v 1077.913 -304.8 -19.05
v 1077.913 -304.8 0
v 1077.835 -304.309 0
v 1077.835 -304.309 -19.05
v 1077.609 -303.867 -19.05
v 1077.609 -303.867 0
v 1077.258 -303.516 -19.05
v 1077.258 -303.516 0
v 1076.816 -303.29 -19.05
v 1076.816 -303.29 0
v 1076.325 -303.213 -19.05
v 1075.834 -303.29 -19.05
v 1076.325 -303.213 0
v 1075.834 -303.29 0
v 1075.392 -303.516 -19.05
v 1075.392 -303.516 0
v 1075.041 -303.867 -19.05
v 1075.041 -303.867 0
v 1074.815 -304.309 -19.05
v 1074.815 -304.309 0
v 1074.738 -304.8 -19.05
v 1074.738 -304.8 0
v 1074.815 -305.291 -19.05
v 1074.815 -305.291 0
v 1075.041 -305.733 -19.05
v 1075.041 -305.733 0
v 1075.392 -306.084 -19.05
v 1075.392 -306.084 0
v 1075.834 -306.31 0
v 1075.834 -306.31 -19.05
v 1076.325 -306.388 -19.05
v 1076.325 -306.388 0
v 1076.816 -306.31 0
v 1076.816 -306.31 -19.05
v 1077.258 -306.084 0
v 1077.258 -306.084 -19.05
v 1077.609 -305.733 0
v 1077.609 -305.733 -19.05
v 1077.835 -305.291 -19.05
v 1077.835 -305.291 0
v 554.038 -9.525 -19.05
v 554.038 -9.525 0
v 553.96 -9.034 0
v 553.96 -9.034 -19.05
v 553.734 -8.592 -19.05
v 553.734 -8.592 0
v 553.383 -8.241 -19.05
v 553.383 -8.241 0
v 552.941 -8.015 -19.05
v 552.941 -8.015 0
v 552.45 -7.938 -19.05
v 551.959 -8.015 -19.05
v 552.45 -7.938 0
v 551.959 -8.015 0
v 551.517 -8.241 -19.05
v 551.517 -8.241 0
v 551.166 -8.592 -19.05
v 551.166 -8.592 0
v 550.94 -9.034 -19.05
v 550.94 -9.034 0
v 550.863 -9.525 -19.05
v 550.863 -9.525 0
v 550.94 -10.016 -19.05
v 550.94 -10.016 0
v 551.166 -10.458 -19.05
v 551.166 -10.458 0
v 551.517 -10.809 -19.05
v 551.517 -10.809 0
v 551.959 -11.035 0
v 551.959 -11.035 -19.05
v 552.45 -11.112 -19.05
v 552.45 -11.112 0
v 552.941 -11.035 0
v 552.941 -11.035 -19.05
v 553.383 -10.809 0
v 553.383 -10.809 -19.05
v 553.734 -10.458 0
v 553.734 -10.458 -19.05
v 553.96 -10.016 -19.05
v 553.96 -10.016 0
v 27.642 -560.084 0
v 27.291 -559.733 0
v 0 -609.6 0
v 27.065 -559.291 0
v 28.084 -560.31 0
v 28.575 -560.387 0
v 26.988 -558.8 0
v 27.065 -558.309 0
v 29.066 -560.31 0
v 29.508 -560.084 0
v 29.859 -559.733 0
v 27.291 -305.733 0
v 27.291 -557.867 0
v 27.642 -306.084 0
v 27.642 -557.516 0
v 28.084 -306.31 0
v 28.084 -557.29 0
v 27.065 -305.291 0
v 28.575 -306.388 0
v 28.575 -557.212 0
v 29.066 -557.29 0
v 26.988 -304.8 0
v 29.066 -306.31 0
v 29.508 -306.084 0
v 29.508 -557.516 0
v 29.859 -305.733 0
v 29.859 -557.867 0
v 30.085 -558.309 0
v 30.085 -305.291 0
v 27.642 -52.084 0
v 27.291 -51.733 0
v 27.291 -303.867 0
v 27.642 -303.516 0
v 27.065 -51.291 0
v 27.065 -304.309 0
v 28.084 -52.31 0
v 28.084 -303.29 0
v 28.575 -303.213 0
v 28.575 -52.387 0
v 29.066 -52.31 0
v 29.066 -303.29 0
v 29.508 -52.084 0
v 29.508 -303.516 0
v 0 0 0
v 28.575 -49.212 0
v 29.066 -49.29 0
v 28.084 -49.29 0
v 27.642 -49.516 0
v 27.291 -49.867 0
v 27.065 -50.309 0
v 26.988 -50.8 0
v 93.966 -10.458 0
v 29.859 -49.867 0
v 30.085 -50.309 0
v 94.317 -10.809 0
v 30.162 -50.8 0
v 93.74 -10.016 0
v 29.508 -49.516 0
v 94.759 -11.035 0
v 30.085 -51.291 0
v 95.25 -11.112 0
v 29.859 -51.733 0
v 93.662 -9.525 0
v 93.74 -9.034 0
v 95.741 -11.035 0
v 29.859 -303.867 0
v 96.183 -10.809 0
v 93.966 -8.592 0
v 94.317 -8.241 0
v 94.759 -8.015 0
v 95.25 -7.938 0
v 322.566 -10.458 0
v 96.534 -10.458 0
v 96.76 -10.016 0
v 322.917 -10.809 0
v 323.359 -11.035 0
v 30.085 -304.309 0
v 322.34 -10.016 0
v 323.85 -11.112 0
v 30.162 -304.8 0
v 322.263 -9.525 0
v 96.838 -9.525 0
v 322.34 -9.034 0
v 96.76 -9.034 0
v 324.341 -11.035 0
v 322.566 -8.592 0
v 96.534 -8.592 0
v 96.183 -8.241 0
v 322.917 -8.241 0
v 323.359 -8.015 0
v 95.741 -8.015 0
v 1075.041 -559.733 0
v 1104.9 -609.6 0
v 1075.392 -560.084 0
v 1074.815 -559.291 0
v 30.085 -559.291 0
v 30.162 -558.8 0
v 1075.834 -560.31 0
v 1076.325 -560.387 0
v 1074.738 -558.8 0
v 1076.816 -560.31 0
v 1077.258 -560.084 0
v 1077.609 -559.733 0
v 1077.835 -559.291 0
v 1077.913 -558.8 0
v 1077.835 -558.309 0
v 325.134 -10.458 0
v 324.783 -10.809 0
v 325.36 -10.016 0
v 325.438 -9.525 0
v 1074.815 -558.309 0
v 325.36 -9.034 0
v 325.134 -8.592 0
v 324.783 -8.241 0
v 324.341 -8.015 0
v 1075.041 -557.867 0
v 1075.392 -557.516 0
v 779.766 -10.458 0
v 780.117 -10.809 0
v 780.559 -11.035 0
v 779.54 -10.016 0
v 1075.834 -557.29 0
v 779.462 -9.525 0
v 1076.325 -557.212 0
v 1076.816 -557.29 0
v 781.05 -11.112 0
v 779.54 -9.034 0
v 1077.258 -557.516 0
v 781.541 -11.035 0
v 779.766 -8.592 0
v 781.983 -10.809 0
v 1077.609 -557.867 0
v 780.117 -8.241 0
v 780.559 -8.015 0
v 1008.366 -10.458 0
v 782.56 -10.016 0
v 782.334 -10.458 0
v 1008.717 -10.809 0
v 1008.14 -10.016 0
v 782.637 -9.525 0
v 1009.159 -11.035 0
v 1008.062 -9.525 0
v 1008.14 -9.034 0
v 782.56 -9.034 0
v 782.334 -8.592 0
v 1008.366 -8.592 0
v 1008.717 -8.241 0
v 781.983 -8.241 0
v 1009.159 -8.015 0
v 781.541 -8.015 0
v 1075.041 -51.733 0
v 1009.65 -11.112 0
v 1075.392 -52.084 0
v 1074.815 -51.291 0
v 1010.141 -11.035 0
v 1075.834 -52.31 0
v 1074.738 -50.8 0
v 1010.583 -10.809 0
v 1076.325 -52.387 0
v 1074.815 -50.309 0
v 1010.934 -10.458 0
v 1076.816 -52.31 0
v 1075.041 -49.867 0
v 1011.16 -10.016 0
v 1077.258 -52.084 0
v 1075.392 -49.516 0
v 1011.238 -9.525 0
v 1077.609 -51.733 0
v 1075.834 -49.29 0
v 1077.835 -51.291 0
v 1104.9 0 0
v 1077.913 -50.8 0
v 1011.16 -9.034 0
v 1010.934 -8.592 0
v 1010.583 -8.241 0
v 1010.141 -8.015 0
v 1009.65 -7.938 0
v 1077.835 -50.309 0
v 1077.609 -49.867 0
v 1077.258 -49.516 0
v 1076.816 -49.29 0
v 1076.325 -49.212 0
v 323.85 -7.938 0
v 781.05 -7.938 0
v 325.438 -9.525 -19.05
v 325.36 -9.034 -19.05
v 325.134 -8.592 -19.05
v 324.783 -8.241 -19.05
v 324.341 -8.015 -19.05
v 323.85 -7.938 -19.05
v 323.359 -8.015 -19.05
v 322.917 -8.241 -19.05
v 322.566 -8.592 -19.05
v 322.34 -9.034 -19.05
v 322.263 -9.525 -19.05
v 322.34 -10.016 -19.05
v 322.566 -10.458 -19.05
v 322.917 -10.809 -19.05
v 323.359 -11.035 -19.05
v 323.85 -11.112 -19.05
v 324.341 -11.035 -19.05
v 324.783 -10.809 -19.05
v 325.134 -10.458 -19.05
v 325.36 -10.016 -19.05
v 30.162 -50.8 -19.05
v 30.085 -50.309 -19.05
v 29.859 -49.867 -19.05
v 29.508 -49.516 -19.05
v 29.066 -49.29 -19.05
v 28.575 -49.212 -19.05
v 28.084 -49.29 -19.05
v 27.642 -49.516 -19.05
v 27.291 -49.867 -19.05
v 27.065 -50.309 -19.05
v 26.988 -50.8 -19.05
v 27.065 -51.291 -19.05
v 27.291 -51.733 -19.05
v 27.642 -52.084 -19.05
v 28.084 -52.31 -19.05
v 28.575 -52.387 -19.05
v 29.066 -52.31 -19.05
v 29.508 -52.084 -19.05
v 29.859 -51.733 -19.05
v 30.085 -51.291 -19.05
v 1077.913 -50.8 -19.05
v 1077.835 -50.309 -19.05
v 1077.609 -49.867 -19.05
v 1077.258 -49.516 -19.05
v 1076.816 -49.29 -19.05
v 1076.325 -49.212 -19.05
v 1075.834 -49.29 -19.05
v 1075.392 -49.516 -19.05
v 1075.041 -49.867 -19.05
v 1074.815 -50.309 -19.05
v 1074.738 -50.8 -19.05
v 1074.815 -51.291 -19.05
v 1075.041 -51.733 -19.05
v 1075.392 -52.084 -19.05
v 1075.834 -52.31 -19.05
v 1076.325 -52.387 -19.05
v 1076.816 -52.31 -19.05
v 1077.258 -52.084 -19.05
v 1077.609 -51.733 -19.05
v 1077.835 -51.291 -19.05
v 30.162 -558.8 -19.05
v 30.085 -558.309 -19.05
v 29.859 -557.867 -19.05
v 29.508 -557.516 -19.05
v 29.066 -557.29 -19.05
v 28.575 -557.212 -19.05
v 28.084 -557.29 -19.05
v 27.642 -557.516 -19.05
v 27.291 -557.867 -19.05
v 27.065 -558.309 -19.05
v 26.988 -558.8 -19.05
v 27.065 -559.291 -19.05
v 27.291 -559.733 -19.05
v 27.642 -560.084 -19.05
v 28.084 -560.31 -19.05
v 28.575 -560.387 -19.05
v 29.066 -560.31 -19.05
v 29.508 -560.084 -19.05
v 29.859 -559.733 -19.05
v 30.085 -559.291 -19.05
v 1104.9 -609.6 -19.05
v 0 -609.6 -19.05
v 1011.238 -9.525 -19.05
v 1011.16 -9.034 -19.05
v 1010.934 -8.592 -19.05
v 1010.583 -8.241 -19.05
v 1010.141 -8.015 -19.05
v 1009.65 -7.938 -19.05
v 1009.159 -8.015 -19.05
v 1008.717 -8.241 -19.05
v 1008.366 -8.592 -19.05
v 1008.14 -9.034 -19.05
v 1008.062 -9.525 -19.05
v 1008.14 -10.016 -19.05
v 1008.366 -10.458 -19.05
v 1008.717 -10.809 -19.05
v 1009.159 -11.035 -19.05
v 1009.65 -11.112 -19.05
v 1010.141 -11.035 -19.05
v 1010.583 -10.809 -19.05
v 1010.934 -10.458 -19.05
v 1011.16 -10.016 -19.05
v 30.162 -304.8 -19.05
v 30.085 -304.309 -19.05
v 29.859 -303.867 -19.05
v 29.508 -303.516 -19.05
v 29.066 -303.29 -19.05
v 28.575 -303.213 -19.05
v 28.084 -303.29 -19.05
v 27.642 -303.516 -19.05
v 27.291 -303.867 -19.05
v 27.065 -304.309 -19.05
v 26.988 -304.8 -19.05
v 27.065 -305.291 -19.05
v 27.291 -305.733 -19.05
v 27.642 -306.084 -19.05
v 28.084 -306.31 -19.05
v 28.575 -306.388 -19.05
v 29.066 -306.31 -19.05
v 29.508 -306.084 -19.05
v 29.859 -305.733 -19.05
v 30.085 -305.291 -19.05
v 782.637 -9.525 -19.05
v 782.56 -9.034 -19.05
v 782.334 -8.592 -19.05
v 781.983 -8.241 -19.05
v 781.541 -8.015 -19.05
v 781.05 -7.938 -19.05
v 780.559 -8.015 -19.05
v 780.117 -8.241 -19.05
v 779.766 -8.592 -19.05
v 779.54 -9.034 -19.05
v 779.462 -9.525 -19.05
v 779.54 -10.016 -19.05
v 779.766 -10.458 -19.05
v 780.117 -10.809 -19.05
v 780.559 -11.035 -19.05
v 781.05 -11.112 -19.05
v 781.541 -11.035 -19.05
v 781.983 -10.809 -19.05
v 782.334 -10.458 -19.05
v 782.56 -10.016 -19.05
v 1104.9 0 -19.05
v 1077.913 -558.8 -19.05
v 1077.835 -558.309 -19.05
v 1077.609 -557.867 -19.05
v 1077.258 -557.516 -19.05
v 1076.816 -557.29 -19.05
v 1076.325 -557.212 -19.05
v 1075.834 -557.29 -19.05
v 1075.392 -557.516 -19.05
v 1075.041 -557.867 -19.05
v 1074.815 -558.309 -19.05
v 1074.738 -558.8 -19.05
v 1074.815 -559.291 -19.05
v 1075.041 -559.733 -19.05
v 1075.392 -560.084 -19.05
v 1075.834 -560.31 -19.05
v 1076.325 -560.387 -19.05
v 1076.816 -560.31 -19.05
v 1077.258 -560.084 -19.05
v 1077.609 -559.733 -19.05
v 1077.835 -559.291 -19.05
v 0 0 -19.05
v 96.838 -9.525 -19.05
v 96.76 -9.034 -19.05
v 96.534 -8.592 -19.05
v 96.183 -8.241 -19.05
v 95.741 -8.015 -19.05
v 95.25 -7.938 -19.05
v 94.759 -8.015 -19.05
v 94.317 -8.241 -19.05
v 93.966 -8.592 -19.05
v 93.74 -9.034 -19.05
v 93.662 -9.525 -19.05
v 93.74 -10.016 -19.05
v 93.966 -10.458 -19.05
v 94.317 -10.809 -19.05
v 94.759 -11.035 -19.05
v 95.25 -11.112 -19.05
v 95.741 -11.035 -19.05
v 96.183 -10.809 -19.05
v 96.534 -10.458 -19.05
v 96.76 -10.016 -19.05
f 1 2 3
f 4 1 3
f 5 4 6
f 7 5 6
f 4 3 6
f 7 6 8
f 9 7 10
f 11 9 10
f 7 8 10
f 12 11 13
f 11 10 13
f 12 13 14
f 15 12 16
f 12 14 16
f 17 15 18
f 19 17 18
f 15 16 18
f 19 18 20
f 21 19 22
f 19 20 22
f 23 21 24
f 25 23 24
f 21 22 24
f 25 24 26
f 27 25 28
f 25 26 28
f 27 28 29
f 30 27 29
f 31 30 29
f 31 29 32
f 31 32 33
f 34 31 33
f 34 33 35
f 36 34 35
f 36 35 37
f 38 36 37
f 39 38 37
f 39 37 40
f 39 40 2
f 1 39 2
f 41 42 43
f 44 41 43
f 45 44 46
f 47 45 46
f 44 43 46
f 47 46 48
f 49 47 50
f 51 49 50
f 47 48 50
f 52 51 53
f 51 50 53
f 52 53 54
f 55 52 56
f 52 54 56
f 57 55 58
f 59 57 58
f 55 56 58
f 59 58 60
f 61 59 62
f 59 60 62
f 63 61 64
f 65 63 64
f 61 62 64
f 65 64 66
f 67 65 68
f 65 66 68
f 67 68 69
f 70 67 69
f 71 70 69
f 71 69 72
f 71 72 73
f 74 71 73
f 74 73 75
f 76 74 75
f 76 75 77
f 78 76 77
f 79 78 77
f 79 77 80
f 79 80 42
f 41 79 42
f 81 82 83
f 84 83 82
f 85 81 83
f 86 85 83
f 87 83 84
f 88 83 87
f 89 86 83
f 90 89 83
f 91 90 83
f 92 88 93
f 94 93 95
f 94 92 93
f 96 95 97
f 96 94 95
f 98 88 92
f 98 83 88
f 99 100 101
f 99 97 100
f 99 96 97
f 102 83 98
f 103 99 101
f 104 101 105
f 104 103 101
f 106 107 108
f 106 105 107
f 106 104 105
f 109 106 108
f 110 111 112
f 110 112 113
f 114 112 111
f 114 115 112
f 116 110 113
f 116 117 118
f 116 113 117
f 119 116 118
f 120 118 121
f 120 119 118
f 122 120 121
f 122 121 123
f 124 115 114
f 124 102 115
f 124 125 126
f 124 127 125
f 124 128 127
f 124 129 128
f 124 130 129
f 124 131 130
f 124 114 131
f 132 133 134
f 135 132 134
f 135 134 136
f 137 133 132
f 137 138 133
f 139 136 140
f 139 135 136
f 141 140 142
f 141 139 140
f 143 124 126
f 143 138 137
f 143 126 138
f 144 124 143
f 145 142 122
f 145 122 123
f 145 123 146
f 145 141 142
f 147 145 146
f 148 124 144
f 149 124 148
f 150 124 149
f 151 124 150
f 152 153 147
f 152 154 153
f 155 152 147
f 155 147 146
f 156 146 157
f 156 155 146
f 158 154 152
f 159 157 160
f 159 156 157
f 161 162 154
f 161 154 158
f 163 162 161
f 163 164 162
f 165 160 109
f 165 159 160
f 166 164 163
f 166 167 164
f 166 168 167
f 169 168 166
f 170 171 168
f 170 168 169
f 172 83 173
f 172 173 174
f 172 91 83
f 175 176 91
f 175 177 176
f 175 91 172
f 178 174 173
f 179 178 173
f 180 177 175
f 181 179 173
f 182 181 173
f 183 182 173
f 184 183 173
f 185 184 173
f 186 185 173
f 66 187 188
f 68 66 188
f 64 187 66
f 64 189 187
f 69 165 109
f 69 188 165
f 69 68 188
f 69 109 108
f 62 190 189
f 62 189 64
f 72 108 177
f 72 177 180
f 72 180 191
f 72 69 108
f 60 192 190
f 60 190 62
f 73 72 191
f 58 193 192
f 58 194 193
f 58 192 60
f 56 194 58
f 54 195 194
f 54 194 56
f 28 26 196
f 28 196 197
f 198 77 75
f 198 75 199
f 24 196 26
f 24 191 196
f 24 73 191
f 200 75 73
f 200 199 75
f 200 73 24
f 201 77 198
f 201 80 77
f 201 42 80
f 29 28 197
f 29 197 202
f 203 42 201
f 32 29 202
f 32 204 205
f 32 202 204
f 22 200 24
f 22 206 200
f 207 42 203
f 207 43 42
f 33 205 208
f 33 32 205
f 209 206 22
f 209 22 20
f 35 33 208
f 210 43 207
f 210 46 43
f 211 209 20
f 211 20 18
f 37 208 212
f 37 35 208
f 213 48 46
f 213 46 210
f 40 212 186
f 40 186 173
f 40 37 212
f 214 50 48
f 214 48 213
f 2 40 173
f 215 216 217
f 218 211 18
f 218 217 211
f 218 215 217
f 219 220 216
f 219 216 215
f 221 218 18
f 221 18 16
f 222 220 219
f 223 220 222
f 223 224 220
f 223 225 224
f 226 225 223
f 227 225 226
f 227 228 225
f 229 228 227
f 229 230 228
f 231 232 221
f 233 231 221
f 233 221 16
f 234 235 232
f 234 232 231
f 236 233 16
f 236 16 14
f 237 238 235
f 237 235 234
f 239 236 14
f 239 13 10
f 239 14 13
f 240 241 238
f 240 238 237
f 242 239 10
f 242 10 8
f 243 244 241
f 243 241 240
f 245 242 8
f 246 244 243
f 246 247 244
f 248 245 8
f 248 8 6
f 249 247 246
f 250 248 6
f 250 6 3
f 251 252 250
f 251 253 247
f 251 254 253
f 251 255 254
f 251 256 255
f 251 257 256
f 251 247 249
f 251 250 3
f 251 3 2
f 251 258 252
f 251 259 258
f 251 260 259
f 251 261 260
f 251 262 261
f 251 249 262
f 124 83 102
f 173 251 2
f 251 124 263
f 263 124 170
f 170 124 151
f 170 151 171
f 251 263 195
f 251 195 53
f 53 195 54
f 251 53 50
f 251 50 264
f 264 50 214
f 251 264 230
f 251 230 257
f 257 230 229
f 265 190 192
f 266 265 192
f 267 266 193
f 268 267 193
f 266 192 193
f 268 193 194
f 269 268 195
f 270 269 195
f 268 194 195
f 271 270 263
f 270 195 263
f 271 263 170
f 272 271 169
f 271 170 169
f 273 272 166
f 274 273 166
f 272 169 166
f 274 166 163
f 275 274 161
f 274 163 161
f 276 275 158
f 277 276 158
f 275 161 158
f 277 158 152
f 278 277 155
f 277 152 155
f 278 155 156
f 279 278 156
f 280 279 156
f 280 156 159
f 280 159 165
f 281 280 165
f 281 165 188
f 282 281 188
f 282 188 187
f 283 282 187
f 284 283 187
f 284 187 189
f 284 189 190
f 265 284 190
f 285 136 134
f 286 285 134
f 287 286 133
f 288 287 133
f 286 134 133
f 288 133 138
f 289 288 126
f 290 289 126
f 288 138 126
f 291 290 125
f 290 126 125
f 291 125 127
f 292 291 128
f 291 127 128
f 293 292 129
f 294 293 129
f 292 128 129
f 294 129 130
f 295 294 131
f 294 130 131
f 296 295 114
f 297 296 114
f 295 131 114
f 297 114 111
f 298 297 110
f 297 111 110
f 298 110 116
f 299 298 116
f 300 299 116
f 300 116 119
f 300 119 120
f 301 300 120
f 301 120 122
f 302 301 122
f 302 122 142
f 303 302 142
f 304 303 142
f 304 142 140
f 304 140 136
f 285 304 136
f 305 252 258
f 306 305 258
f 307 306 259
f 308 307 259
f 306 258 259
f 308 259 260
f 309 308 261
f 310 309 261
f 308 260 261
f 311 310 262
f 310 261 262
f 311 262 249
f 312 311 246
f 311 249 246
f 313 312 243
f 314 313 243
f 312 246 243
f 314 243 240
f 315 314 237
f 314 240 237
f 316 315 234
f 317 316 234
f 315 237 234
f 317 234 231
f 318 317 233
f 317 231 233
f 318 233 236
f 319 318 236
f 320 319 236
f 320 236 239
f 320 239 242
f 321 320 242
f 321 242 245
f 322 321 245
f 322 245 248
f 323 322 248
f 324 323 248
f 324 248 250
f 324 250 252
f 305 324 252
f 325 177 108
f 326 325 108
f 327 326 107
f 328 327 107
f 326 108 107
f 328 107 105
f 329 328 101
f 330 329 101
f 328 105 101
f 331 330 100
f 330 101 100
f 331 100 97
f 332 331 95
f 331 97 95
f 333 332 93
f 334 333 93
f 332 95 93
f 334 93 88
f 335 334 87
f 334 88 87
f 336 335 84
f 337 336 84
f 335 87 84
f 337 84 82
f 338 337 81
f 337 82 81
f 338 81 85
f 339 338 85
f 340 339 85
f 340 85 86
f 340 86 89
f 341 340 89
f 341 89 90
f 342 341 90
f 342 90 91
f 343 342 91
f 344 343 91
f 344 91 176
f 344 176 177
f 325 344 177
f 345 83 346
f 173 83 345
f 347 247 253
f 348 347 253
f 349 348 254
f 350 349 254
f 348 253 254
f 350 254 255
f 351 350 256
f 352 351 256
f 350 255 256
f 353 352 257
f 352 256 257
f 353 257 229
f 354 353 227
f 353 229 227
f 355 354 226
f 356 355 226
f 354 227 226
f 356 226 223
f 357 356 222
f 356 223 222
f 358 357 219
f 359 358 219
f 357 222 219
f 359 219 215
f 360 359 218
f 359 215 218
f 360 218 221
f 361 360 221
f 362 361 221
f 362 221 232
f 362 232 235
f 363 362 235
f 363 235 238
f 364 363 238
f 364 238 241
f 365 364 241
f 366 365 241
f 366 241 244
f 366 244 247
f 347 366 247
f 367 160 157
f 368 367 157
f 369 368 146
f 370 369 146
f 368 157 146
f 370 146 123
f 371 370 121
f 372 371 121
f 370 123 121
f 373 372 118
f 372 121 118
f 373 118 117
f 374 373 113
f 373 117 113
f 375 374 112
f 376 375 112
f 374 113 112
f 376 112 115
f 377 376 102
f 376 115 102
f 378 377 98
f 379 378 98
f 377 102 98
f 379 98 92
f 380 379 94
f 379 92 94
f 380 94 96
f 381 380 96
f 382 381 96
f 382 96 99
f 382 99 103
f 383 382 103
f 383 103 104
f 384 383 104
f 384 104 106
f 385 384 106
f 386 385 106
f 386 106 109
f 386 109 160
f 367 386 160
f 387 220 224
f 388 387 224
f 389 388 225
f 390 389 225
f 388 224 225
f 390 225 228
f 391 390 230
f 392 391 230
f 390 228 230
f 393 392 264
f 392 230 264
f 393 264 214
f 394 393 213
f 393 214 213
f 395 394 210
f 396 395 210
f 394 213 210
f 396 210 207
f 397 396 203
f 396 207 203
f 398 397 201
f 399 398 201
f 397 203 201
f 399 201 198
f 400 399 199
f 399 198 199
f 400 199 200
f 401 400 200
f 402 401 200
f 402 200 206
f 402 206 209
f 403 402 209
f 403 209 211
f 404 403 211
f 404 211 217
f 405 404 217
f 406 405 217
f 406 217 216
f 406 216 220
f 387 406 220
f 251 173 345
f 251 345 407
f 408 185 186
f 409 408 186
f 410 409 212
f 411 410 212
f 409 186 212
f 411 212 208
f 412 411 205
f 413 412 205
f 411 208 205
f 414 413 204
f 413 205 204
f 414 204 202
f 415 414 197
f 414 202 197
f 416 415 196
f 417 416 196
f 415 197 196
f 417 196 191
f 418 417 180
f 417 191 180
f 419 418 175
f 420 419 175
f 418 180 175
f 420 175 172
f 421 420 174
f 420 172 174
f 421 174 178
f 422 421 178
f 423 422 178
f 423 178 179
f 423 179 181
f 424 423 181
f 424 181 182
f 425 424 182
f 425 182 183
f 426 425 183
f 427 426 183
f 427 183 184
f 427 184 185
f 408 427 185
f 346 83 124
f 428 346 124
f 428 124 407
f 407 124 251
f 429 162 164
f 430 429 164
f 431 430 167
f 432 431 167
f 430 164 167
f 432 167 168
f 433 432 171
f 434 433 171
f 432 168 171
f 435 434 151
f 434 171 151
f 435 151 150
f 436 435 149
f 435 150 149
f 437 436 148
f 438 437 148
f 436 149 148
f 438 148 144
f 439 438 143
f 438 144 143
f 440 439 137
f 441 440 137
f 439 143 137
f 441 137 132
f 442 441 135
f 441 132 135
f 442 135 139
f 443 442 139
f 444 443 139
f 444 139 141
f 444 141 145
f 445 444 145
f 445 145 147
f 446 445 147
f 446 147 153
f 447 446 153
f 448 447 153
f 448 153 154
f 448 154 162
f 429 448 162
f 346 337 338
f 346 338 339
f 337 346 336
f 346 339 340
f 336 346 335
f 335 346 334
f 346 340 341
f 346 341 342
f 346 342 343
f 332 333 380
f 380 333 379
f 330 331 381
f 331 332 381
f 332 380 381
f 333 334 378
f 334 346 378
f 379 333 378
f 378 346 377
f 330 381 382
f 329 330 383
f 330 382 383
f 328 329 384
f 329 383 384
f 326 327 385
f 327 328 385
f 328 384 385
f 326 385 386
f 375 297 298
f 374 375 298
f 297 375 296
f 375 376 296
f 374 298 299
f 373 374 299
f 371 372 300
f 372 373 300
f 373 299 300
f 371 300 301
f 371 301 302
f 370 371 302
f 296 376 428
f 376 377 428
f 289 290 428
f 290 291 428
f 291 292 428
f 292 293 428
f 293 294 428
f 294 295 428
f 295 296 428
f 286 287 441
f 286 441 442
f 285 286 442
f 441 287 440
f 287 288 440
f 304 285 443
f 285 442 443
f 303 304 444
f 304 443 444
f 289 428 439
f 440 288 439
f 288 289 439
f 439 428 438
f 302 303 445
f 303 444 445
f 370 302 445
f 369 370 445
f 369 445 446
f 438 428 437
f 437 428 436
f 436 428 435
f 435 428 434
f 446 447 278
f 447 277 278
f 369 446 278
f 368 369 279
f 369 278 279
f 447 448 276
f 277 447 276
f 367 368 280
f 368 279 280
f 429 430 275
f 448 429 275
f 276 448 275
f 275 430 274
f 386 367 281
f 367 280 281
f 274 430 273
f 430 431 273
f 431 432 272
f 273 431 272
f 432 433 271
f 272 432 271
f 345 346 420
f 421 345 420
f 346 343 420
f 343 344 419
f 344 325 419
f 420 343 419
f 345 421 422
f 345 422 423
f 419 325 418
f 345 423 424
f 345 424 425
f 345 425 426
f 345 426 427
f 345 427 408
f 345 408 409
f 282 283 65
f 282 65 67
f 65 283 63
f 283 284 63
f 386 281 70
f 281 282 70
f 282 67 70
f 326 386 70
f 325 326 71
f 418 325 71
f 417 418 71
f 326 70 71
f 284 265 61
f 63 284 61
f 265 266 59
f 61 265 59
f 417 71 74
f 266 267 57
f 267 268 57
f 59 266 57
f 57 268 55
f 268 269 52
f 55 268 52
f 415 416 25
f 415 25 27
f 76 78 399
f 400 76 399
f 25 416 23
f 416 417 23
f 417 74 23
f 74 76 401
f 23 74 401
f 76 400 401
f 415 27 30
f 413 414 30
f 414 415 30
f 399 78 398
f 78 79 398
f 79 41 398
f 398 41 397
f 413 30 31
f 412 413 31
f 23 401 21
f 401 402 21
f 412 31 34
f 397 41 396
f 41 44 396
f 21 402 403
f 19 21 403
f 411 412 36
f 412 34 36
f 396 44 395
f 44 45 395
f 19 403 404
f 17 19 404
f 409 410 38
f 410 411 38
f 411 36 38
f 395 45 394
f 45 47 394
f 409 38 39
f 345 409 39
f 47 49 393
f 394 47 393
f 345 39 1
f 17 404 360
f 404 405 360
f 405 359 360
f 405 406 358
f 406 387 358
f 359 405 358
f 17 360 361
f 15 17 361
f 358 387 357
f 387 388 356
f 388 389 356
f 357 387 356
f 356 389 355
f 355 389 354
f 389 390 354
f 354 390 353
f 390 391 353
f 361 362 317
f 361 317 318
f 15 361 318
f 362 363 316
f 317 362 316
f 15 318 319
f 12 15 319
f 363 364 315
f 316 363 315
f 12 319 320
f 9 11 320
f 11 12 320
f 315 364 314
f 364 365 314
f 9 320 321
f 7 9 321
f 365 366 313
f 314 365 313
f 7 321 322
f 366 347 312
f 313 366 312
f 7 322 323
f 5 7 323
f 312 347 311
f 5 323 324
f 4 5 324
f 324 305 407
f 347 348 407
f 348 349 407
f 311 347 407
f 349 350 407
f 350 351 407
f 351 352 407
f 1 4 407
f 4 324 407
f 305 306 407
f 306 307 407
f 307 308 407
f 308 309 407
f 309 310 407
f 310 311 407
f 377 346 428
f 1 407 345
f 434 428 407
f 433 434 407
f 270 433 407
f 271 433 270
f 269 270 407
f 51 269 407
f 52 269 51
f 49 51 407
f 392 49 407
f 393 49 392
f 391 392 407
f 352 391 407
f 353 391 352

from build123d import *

# Parameters (mm, degrees)
F0_W     = 1104.9
F0_H     = 609.6
F1_DEPTH = 19.05
F2_R     = 1.5875
F3_DEPTH = 19.051
F4_R     = 1.5875
F5_DEPTH = 19.051


with BuildPart() as f1:
    # F0 (on Top) → F1 (new body)
    with BuildSketch(Plane.XY):
        with Locations((552.45, -304.8)):
            Rectangle(F0_W, F0_H)
    extrude(amount=-F1_DEPTH)

    # F2 (on Top) → F3 (cut, through all)
    with BuildSketch(Plane.XY):
        with Locations((95.25, -9.525)):
            Circle(F2_R)
        with Locations((323.85, -9.525)):
            Circle(F2_R)
        with Locations((552.45, -9.525)):
            Circle(F2_R)
        with Locations((781.05, -9.525)):
            Circle(F2_R)
        with Locations((1009.65, -9.525)):
            Circle(F2_R)
    extrude(amount=-F3_DEPTH, mode=Mode.SUBTRACT)

    # F4 (on Top) → F5 (cut, through all)
    with BuildSketch(Plane.XY):
        with Locations((28.575, -50.8)):
            Circle(F4_R)
        with Locations((28.575, -304.8)):
            Circle(F4_R)
        with Locations((28.575, -558.8)):
            Circle(F4_R)
        with Locations((1076.325, -50.8)):
            Circle(F4_R)
        with Locations((1076.325, -304.8)):
            Circle(F4_R)
        with Locations((1076.325, -558.8)):
            Circle(F4_R)
    extrude(amount=-F5_DEPTH, mode=Mode.SUBTRACT)


solid = f1.part
